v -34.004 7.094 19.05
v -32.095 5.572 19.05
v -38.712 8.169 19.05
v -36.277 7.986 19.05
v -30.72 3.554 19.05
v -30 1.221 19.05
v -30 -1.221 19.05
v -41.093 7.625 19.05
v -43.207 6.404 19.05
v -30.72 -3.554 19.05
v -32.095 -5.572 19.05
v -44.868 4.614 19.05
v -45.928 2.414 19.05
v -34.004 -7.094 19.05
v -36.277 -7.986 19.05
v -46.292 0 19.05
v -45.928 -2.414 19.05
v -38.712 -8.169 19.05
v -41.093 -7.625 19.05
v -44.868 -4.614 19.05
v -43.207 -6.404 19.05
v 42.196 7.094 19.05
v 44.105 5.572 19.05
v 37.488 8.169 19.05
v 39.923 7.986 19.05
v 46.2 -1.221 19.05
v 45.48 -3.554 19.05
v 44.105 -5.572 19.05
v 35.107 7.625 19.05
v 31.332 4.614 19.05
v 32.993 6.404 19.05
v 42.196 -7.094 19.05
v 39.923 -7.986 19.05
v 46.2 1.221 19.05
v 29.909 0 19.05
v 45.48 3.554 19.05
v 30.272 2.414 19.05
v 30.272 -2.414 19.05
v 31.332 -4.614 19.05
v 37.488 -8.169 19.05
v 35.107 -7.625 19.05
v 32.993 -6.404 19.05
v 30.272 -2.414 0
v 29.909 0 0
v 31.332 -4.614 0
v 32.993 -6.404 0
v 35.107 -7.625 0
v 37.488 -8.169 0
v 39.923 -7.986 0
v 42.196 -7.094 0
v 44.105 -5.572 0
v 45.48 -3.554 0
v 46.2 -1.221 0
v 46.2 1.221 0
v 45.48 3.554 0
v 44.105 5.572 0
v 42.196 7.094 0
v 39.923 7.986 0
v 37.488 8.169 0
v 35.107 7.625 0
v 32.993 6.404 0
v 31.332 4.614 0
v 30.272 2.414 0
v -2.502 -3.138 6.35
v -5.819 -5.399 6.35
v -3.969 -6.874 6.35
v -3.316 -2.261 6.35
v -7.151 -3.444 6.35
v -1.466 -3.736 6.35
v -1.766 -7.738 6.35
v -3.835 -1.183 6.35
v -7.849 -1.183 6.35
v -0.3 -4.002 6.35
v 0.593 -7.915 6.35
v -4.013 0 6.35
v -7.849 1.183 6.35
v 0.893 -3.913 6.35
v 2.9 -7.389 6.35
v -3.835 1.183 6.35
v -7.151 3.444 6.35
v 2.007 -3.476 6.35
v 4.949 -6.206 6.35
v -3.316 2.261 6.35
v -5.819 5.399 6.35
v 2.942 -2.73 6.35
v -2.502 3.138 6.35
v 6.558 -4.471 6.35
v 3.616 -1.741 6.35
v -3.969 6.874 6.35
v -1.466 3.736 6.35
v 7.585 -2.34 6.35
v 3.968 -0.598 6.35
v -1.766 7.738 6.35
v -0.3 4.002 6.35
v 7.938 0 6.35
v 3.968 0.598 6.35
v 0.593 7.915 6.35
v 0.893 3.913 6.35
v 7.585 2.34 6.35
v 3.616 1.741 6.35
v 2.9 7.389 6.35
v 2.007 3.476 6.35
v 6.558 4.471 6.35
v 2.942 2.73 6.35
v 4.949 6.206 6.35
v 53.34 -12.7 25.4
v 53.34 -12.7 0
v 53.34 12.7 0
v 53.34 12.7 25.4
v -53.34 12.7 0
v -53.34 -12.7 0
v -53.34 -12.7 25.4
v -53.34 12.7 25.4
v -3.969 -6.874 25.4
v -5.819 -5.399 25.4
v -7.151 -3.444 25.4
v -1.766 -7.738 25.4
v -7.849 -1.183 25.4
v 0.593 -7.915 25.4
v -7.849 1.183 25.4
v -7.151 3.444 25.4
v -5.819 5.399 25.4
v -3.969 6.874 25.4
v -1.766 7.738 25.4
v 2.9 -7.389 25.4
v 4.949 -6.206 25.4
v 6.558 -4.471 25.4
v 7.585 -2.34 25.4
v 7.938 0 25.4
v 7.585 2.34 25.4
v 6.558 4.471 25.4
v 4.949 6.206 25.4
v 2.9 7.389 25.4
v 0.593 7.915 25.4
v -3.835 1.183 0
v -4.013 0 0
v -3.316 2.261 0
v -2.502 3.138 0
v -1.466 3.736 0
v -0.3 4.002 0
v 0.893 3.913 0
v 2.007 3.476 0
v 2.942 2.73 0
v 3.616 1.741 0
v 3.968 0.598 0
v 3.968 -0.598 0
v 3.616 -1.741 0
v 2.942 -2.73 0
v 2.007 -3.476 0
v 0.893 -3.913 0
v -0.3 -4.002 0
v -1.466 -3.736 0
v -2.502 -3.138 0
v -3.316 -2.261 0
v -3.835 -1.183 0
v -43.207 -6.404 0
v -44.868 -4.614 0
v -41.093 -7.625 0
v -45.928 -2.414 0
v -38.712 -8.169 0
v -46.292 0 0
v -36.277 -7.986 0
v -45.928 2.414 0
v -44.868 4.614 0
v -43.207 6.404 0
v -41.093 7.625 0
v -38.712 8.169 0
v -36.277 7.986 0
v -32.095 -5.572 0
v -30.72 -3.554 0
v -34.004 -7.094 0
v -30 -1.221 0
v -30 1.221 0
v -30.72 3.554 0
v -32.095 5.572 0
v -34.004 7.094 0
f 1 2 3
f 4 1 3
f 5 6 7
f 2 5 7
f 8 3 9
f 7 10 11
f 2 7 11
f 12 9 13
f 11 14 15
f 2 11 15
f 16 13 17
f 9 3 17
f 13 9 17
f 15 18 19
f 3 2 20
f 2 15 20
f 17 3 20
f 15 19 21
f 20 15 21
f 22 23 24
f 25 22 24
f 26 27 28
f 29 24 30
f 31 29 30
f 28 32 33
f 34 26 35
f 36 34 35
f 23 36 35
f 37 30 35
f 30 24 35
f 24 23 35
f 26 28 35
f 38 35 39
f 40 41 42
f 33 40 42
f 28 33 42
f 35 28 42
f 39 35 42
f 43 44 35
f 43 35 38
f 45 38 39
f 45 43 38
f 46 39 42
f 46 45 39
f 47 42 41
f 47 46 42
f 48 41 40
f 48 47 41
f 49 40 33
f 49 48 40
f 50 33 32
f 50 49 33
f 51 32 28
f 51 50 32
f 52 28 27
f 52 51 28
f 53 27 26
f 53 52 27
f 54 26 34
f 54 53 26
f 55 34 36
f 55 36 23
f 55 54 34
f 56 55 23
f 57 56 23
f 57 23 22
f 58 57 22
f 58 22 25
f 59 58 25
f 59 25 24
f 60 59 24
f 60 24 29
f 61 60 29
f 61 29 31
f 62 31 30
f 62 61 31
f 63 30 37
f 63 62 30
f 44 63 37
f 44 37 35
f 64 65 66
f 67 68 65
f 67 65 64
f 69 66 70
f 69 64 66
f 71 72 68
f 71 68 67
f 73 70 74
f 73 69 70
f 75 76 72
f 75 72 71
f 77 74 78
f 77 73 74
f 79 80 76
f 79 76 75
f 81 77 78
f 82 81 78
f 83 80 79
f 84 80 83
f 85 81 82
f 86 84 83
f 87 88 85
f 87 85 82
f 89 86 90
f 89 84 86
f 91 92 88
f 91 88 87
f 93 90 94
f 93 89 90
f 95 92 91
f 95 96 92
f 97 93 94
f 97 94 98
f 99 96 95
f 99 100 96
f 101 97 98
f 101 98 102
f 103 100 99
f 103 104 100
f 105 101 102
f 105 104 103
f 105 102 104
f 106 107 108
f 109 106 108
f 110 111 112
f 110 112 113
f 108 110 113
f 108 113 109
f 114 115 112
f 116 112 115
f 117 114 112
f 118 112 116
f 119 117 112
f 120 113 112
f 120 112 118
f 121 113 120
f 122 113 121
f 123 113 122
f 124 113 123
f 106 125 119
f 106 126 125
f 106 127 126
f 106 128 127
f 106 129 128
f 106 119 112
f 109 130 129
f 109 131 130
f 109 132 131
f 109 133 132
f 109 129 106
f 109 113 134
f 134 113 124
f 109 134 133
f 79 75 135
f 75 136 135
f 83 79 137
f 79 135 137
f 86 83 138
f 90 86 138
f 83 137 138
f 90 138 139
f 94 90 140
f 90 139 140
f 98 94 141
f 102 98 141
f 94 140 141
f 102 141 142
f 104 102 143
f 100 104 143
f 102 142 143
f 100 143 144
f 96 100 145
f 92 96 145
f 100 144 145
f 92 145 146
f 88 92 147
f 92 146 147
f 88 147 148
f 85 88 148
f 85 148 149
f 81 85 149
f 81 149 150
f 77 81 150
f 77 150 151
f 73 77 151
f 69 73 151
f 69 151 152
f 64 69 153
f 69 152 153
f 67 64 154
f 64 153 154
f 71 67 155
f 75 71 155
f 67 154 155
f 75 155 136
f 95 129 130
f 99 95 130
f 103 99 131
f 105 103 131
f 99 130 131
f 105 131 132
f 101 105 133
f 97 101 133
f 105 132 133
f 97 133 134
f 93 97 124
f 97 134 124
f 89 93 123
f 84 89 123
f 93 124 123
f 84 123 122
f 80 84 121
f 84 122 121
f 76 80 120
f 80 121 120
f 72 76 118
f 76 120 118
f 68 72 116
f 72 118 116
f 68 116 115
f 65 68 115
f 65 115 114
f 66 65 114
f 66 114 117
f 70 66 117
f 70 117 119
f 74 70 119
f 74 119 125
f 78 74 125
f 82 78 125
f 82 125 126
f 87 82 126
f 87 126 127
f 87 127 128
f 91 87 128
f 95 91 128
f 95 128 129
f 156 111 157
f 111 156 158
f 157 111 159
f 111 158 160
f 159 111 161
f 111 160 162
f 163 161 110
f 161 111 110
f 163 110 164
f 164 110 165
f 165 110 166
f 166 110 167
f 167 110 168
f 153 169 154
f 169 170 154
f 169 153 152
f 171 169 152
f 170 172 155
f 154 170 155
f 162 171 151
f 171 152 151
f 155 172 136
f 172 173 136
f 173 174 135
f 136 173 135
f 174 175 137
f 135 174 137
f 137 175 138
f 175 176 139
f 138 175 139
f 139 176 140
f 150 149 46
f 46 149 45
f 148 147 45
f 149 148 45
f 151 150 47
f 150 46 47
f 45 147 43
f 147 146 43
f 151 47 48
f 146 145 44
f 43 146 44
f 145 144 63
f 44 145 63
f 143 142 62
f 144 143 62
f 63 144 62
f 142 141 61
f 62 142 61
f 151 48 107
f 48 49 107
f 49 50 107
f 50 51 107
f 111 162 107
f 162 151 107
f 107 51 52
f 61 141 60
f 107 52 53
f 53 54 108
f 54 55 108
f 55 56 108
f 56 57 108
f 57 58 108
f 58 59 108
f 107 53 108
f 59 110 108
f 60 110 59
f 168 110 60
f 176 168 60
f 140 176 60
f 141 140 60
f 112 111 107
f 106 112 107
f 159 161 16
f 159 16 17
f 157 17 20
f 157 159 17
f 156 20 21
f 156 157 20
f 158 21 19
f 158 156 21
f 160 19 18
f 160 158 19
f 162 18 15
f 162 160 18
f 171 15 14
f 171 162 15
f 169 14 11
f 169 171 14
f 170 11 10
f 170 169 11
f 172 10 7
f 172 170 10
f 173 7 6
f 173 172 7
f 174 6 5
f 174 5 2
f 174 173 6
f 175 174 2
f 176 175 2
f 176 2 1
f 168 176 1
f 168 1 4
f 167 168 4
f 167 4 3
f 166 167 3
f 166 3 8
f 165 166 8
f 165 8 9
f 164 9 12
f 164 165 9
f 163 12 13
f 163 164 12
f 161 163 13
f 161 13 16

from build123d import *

# Parameters (mm, degrees)
SKETCH1_W                                            = 106.68
SKETCH1_H                                            = 25.4
BOSS_EXTRUDE1_DEPTH                                  = 25.4
SKETCH1_3_R                                          = 8.1915
CUT_EXTRUDE1_DEPTH                                   = 19.05
CBORE_FOR_1_4_BINDING_HEAD_MACHINE_SCREW_D           = 8.0264
CBORE_FOR_1_4_BINDING_HEAD_MACHINE_SCREW_CBORE_D     = 15.875
CBORE_FOR_1_4_BINDING_HEAD_MACHINE_SCREW_CBORE_DEPTH = 19.05


with BuildPart() as part:
    # Sketch1 → Boss-Extrude1 (new body)
    with BuildSketch(Plane.XY):
        Rectangle(SKETCH1_W, SKETCH1_H)
    extrude(amount=BOSS_EXTRUDE1_DEPTH)

    # Sketch1<3> → Cut-Extrude1 (cut)
    with BuildSketch(Plane.XY):
        with Locations(Location((-38.1, 0, 0), (0, 0, 180))):
            Circle(SKETCH1_3_R)
        with Locations(Location((38.1, 0, 0), (0, 0, 180))):
            Circle(SKETCH1_3_R)
    extrude(amount=CUT_EXTRUDE1_DEPTH, mode=Mode.SUBTRACT)

    # CBORE for 1/4 Binding Head Machine Screw1 (through all)
    with Locations(Plane.XY.offset(25.4)):
        with Locations((0, 0)):
            CounterBoreHole(CBORE_FOR_1_4_BINDING_HEAD_MACHINE_SCREW_D / 2, CBORE_FOR_1_4_BINDING_HEAD_MACHINE_SCREW_CBORE_D / 2, CBORE_FOR_1_4_BINDING_HEAD_MACHINE_SCREW_CBORE_DEPTH)


solid = part.part
